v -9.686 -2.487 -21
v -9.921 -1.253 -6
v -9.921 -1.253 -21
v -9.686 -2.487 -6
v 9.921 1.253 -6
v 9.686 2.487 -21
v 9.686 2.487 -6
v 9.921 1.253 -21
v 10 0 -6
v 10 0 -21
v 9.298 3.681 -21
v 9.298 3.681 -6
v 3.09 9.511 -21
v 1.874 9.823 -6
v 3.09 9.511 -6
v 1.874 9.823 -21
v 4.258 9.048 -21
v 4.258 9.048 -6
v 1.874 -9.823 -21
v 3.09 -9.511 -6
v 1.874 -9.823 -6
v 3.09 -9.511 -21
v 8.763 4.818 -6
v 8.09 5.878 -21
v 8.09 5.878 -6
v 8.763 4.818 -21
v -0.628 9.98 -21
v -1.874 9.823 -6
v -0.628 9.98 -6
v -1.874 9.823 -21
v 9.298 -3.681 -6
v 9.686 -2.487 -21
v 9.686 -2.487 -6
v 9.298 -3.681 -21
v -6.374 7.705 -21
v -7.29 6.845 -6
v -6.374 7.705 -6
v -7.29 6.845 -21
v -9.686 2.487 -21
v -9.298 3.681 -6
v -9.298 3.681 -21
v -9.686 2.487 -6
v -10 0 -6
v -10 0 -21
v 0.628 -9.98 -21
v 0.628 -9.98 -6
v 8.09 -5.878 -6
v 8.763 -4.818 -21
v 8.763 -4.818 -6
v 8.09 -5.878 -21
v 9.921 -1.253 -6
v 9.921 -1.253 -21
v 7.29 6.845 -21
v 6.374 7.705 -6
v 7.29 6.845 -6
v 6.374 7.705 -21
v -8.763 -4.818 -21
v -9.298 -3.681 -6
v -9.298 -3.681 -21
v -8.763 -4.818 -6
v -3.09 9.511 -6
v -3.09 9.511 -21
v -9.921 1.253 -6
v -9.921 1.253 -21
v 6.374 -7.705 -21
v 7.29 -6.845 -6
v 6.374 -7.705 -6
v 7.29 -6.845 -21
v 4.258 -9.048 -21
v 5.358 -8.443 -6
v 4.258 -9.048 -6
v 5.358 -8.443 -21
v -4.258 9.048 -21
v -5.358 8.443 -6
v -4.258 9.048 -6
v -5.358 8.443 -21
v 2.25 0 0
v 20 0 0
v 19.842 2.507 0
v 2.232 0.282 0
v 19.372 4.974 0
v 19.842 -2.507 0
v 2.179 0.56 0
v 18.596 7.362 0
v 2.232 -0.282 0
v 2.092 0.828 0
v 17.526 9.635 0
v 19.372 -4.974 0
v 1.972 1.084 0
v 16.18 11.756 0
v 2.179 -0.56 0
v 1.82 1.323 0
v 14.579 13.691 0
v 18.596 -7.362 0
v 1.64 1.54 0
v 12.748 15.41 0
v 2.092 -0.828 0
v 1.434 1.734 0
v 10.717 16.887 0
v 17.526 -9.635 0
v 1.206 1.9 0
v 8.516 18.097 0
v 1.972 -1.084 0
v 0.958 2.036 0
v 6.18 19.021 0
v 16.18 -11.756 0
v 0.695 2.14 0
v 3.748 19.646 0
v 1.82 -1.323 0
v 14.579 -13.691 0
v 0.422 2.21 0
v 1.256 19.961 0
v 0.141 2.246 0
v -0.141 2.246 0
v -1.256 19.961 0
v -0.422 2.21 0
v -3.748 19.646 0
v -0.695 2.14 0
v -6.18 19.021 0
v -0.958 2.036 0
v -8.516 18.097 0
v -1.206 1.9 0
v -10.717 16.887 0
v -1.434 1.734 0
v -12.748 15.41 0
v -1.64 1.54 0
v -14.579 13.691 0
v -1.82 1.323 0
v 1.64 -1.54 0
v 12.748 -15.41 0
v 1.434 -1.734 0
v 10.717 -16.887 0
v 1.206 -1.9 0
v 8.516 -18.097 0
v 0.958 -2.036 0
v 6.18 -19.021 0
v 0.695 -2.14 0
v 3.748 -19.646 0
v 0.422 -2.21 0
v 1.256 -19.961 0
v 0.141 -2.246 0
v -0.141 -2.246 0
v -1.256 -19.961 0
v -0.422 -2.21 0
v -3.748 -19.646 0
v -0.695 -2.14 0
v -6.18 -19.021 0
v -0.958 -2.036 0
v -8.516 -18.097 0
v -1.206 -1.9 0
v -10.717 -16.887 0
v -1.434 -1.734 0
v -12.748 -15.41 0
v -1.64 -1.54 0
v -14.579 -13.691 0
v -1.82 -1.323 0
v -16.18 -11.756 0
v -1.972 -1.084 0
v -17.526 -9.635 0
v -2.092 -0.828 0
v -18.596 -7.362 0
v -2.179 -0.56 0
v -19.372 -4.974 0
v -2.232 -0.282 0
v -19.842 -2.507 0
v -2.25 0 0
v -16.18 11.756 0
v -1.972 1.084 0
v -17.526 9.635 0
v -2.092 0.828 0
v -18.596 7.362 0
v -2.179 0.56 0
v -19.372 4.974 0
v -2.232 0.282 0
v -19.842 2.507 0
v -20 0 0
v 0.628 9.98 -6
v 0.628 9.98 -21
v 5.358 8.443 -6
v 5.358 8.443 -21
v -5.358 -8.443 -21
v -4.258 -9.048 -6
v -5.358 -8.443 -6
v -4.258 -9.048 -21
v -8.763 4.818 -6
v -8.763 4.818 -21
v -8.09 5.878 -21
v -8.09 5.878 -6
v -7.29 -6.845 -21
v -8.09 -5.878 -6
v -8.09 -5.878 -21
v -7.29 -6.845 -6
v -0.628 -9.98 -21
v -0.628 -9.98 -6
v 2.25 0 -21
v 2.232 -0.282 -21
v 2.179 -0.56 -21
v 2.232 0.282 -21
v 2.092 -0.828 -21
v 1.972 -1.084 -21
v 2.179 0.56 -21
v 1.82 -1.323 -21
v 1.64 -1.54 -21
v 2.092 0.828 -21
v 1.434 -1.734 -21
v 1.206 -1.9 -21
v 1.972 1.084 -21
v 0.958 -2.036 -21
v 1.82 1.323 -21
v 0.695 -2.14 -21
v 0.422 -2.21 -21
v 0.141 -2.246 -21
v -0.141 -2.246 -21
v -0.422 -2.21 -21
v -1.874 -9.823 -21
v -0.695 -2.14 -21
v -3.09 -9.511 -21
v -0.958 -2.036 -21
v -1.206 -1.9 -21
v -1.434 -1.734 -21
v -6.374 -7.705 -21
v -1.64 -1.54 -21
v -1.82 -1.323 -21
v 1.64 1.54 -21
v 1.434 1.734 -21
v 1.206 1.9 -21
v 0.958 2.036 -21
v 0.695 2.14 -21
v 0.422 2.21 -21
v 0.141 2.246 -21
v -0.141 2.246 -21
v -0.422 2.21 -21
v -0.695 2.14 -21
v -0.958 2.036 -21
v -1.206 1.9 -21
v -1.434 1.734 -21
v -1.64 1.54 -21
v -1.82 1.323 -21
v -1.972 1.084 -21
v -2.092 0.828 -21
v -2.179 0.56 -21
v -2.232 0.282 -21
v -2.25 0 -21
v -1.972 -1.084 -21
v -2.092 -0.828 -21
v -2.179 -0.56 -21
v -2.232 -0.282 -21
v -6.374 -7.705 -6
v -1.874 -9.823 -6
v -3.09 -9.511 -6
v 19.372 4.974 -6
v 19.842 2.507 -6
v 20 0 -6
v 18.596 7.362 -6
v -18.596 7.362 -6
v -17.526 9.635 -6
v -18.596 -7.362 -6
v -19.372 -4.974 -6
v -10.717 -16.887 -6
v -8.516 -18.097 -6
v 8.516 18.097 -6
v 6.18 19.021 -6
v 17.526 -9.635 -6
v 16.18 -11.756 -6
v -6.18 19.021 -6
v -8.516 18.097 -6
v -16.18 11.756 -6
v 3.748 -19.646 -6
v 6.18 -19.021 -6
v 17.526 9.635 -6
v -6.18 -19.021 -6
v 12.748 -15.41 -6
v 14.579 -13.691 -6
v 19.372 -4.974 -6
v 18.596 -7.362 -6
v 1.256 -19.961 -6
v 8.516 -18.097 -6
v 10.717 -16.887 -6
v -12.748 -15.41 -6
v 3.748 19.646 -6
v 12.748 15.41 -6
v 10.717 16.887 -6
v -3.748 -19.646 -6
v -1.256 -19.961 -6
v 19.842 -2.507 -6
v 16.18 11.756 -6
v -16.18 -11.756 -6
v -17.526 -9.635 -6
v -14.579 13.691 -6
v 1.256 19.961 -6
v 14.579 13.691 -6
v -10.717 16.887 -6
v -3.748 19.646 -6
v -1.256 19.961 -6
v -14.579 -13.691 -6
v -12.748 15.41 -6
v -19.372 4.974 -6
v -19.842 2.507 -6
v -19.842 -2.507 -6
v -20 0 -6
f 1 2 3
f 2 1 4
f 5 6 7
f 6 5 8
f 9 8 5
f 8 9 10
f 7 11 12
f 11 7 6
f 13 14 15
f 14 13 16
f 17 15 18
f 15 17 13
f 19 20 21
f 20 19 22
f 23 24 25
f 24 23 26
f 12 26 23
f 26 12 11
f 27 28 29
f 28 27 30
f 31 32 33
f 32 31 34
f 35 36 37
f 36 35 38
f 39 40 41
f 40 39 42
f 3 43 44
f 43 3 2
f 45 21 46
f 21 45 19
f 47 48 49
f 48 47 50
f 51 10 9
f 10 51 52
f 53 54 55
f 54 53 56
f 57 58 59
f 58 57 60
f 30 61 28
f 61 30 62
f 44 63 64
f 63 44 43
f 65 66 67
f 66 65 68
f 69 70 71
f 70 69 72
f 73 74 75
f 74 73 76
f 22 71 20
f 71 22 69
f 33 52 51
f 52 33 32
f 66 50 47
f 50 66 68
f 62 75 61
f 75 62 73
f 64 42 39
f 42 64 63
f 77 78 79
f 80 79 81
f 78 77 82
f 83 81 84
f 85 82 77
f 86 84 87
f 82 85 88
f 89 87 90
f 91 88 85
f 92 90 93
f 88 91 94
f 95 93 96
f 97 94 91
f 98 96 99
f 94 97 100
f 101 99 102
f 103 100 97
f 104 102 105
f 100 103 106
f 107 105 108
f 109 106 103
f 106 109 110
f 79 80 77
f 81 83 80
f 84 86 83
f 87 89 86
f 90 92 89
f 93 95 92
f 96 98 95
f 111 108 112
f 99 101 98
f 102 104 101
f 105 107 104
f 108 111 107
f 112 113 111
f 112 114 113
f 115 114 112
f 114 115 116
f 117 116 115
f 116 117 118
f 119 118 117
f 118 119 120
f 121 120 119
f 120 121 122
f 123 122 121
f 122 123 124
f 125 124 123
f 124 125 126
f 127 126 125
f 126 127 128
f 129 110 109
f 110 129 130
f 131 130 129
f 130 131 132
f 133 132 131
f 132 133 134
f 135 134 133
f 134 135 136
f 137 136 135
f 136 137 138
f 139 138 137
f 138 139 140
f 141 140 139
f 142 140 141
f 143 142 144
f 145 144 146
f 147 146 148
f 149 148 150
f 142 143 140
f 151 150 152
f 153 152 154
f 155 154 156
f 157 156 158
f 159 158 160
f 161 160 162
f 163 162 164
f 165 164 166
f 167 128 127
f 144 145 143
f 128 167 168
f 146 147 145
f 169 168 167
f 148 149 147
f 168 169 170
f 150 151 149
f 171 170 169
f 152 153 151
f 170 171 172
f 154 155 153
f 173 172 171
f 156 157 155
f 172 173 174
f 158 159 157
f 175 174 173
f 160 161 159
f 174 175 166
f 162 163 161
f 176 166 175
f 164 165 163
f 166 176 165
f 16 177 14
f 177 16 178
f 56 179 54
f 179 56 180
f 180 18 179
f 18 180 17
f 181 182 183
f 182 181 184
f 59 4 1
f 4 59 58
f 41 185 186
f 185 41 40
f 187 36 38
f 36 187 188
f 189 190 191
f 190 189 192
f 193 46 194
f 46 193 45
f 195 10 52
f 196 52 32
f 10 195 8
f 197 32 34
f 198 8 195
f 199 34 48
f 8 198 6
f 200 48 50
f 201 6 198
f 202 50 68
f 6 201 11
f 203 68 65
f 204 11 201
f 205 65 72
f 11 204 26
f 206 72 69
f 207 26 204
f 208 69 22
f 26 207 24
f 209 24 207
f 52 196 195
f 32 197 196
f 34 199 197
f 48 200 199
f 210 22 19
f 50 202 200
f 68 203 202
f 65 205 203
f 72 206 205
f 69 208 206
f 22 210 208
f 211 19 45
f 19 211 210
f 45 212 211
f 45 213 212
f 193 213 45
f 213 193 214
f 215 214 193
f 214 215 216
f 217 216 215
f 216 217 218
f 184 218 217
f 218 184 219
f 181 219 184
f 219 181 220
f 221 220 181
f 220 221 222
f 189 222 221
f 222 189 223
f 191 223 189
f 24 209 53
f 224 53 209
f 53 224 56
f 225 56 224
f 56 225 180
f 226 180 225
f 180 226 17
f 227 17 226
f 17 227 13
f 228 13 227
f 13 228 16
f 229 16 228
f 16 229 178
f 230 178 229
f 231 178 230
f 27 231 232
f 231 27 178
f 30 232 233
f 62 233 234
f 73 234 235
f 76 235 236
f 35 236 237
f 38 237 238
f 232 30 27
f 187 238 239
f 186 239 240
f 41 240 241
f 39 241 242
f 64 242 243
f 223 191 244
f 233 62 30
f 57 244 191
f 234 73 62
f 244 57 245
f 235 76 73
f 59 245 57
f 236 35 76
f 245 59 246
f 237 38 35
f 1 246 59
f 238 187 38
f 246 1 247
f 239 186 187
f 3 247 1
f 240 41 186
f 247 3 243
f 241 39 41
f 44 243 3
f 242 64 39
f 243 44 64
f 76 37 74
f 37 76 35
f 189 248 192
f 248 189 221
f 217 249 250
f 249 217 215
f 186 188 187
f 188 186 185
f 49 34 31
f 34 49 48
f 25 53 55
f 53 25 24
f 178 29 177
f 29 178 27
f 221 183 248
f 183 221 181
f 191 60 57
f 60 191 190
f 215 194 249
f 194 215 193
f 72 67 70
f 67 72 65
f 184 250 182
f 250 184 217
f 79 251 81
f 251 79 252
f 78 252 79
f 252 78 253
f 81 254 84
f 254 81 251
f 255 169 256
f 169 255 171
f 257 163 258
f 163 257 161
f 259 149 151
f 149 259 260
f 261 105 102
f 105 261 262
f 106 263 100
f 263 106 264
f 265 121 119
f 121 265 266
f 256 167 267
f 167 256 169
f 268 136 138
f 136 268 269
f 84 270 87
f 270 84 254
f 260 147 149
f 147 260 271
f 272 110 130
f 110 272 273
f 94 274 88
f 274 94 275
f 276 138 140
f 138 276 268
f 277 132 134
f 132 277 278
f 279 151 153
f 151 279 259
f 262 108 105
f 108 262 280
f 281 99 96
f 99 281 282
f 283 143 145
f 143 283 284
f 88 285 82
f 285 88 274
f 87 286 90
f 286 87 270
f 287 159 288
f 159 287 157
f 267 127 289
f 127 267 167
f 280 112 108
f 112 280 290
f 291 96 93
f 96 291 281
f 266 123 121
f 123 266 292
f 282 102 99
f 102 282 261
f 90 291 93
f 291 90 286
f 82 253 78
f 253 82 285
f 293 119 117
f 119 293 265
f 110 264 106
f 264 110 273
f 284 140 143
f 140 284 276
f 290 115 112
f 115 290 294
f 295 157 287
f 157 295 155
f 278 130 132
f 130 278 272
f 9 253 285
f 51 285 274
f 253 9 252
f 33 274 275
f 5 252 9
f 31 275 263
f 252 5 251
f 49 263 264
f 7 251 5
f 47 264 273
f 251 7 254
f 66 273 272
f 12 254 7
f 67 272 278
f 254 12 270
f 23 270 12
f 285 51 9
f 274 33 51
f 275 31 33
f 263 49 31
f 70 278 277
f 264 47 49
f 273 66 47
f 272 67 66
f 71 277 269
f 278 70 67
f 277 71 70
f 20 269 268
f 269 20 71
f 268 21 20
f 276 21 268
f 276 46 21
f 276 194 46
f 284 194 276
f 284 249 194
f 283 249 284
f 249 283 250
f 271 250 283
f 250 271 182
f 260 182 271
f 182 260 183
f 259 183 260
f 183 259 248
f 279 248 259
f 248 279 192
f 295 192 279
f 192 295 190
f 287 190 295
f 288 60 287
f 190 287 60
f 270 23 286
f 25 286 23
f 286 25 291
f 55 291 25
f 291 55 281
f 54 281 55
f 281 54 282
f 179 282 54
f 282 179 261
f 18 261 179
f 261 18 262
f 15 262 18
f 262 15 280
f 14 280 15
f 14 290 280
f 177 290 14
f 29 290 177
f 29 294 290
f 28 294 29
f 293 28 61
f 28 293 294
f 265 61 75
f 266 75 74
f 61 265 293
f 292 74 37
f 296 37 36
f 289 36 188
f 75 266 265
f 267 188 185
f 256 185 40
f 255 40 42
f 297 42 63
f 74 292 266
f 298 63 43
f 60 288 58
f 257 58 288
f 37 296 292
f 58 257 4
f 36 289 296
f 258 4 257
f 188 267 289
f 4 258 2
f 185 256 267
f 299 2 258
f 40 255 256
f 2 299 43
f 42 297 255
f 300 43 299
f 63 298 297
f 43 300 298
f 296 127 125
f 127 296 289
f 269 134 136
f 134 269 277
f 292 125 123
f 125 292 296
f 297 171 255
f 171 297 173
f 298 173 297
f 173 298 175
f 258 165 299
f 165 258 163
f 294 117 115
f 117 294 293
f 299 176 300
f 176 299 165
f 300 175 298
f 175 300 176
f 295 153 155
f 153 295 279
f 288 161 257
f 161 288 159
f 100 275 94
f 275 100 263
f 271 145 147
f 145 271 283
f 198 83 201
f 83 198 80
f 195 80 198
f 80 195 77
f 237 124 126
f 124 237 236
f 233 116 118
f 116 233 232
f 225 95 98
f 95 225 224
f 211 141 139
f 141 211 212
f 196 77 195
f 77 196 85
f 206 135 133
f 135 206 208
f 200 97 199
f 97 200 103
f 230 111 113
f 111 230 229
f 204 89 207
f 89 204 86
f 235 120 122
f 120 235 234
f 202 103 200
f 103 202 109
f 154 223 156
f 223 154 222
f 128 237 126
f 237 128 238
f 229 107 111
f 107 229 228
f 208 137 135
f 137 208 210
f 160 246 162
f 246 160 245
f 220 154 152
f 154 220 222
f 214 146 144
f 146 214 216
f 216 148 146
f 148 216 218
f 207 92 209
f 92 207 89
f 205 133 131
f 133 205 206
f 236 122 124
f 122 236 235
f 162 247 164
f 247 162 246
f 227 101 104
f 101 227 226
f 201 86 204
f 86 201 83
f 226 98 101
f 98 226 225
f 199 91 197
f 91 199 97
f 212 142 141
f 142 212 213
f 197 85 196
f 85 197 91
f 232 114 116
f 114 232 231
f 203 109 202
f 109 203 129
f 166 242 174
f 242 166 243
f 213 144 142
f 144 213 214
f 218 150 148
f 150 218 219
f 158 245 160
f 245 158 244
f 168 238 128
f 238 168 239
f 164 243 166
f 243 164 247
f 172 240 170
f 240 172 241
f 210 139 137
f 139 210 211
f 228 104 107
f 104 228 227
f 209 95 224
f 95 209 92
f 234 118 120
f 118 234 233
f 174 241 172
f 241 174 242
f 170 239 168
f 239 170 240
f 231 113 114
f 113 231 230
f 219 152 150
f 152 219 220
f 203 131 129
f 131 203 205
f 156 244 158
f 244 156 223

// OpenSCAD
$fn = 50;


difference() {
	union() {
		translate(v = [0, 0, -21.0000000000]) {
			cylinder(h = 21, r = 10.0000000000);
		}
		translate(v = [0, 0, -6.0000000000]) {
			cylinder(h = 6, r = 20.0000000000);
		}
	}
	union() {
		#translate(v = [0, 0, -21]) {
			cylinder(h = 21, r = 2.2500000000);
		}
	}
}
